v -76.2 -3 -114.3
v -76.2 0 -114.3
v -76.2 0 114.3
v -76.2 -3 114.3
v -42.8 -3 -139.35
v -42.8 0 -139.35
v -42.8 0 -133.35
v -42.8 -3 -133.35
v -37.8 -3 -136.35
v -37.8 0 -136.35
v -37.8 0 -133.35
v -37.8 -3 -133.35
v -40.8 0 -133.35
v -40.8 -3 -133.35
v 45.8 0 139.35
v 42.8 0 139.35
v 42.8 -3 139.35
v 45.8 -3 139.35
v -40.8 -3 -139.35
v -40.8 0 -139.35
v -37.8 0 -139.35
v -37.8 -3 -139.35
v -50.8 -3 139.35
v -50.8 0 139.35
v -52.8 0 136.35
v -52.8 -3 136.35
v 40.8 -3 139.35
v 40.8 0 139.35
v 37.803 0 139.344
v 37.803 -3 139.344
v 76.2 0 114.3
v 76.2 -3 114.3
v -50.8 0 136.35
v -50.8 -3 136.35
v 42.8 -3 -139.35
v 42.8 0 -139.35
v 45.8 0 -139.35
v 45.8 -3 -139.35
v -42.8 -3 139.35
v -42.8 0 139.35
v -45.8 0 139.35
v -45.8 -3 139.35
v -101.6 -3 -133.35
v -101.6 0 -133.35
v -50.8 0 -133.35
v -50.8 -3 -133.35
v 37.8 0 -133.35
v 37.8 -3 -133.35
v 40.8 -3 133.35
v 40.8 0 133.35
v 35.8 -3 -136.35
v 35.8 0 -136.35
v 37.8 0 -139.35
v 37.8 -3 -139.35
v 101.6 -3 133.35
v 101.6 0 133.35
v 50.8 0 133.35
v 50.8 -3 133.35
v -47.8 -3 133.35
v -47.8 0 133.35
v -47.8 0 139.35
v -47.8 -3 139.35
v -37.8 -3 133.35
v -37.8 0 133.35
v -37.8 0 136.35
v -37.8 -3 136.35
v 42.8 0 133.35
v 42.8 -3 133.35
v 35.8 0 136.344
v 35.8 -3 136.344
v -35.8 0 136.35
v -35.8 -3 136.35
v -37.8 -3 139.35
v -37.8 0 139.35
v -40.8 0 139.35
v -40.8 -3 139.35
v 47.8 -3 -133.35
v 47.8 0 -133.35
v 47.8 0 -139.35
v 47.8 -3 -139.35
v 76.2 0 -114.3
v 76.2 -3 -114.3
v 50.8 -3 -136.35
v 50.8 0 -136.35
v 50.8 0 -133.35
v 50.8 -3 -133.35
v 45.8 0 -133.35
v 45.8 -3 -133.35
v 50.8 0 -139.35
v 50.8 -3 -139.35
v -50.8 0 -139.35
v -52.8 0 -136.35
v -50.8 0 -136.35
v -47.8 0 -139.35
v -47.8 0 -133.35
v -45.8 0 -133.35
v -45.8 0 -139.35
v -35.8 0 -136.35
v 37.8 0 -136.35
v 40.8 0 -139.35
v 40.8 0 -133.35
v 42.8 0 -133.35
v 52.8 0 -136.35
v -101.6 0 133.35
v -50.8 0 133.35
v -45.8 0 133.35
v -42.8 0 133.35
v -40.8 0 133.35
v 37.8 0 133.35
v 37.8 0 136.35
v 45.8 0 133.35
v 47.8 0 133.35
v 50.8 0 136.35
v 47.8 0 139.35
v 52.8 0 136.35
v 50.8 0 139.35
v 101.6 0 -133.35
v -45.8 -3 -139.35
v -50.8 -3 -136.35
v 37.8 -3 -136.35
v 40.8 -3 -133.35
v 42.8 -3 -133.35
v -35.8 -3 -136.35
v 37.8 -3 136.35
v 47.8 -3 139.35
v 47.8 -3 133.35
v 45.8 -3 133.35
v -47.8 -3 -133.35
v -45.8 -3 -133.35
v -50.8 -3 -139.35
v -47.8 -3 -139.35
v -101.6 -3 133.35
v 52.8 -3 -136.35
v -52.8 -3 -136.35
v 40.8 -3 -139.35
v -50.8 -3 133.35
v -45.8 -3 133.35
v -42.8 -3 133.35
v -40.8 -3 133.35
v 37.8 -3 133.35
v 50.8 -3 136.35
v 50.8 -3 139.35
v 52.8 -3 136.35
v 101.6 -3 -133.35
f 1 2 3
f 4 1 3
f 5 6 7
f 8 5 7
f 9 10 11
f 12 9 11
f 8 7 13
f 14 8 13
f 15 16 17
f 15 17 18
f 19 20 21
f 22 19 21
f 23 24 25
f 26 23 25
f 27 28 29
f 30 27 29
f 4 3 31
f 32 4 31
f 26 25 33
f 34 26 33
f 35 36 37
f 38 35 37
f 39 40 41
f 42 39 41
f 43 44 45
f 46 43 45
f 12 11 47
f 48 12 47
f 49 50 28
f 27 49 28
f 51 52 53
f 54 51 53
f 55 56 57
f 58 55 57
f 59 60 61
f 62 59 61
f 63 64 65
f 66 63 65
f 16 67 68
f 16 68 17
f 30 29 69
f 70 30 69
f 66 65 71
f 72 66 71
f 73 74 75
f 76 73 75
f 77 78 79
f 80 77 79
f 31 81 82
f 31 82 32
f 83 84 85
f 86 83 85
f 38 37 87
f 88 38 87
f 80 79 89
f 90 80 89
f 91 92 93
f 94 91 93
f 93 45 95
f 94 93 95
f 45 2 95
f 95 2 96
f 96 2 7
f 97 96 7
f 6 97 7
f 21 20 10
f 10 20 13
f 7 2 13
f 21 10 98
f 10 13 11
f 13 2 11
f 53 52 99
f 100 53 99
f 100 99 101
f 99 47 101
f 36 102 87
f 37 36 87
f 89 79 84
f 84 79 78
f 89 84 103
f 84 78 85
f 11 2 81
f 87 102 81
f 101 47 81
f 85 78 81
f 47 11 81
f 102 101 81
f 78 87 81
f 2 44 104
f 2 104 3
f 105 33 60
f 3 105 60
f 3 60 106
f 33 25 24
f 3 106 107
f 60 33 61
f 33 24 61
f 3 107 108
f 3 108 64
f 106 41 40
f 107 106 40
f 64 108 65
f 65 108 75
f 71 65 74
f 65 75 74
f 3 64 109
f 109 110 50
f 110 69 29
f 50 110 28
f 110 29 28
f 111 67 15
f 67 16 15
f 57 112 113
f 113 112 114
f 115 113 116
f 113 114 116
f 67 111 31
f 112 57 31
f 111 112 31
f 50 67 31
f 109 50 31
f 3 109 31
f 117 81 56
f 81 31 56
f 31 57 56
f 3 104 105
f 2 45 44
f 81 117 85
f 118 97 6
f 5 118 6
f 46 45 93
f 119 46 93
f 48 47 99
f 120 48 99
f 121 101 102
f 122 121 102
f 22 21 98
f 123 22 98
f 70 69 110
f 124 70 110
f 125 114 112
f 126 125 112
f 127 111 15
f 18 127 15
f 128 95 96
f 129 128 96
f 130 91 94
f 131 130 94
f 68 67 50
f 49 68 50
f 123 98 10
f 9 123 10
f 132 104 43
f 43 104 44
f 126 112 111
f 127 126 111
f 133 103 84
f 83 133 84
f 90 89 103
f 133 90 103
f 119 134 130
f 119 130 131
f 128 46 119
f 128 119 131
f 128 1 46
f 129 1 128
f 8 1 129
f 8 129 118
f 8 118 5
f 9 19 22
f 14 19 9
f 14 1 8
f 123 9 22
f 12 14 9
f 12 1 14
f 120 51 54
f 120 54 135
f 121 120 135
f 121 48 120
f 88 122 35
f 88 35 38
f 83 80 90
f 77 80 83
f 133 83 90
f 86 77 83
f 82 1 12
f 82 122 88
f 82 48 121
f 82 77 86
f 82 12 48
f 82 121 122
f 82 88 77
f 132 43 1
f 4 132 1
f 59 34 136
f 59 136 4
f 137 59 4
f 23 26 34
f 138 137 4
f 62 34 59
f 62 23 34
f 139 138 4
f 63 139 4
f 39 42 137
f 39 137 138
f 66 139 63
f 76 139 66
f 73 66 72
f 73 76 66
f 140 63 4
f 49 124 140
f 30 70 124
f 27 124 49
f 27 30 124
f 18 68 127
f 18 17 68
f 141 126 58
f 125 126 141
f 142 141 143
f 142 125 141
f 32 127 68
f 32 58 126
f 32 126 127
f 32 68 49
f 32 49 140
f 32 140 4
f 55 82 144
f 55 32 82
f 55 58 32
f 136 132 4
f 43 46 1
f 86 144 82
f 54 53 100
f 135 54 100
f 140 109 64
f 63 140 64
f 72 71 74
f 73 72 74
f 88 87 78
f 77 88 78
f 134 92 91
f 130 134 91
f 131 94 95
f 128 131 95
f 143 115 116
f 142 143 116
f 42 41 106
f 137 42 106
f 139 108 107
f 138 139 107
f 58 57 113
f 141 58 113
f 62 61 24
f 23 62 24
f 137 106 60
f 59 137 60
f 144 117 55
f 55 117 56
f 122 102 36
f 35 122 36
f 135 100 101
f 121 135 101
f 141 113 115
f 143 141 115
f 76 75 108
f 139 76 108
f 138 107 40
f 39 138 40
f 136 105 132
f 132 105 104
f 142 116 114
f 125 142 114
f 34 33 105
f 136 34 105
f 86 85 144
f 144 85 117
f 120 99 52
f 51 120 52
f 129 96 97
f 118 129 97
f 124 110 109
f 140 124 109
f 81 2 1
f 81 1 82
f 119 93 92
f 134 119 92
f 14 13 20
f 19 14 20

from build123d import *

# Parameters (mm, degrees)
F0_W     = 152.4
F0_H     = 228.6
F0_W_2   = 3
F0_H_2   = 6
F1_DEPTH = 3


with BuildPart() as f1:
    # F0 (on Front) → F1 (new body)
    with BuildSketch(Plane.XZ):
        Polygon((101.6, -133.35), (101.6, 133.35), (50.8, 133.35), (47.8, 133.35), (45.8, 133.35), (42.8, 133.35), (40.8, 133.35), (37.8, 133.35), (-37.8, 133.35), (-37.8, 136.35), (-35.8, 136.35), (-37.8, 139.35), (-40.8, 139.35), (-40.8, 133.35), (-42.8, 133.35), (-42.8, 139.35), (-45.8, 139.35), (-45.8, 133.35), (-47.8, 133.35), (-47.8, 139.35), (-50.8, 139.35), (-52.8, 136.35), (-50.8, 136.35), (-50.8, 133.35), (-101.6, 133.35), (-101.6, -133.35), (-50.8, -133.35), (-50.8, -136.35), (-52.8, -136.35), (-50.8, -139.35), (-47.8, -139.35), (-47.8, -133.35), (-45.8, -133.35), (-45.8, -139.35), (-42.8, -139.35), (-42.8, -133.35), (-40.8, -133.35), (-40.8, -139.35), (-37.8, -139.35), (-35.8, -136.35), (-37.8, -136.35), (-37.8, -133.35), (37.8, -133.35), (37.8, -136.35), (35.8, -136.35), (37.8, -139.35), (40.8, -139.35), (40.8, -133.35), (42.8, -133.35), (42.8, -139.35), (45.8, -139.35), (45.8, -133.35), (47.8, -133.35), (47.8, -139.35), (50.8, -139.35), (52.8, -136.35), (50.8, -136.35), (50.8, -133.35), align=None)
        Rectangle(F0_W, F0_H, mode=Mode.SUBTRACT)
        Polygon((47.8, 133.35), (50.8, 133.35), (50.8, 136.35), (52.8, 136.35), (50.8, 139.35), (47.8, 139.35), align=None)
        with Locations((44.3, 136.35)):
            Rectangle(F0_W_2, F0_H_2)
        Polygon((37.8, 133.35), (40.8, 133.35), (40.8, 139.35), (37.802805, 139.3444), (35.8, 136.3444), (37.8, 136.35), align=None)
    extrude(amount=F1_DEPTH)


solid = f1.part
